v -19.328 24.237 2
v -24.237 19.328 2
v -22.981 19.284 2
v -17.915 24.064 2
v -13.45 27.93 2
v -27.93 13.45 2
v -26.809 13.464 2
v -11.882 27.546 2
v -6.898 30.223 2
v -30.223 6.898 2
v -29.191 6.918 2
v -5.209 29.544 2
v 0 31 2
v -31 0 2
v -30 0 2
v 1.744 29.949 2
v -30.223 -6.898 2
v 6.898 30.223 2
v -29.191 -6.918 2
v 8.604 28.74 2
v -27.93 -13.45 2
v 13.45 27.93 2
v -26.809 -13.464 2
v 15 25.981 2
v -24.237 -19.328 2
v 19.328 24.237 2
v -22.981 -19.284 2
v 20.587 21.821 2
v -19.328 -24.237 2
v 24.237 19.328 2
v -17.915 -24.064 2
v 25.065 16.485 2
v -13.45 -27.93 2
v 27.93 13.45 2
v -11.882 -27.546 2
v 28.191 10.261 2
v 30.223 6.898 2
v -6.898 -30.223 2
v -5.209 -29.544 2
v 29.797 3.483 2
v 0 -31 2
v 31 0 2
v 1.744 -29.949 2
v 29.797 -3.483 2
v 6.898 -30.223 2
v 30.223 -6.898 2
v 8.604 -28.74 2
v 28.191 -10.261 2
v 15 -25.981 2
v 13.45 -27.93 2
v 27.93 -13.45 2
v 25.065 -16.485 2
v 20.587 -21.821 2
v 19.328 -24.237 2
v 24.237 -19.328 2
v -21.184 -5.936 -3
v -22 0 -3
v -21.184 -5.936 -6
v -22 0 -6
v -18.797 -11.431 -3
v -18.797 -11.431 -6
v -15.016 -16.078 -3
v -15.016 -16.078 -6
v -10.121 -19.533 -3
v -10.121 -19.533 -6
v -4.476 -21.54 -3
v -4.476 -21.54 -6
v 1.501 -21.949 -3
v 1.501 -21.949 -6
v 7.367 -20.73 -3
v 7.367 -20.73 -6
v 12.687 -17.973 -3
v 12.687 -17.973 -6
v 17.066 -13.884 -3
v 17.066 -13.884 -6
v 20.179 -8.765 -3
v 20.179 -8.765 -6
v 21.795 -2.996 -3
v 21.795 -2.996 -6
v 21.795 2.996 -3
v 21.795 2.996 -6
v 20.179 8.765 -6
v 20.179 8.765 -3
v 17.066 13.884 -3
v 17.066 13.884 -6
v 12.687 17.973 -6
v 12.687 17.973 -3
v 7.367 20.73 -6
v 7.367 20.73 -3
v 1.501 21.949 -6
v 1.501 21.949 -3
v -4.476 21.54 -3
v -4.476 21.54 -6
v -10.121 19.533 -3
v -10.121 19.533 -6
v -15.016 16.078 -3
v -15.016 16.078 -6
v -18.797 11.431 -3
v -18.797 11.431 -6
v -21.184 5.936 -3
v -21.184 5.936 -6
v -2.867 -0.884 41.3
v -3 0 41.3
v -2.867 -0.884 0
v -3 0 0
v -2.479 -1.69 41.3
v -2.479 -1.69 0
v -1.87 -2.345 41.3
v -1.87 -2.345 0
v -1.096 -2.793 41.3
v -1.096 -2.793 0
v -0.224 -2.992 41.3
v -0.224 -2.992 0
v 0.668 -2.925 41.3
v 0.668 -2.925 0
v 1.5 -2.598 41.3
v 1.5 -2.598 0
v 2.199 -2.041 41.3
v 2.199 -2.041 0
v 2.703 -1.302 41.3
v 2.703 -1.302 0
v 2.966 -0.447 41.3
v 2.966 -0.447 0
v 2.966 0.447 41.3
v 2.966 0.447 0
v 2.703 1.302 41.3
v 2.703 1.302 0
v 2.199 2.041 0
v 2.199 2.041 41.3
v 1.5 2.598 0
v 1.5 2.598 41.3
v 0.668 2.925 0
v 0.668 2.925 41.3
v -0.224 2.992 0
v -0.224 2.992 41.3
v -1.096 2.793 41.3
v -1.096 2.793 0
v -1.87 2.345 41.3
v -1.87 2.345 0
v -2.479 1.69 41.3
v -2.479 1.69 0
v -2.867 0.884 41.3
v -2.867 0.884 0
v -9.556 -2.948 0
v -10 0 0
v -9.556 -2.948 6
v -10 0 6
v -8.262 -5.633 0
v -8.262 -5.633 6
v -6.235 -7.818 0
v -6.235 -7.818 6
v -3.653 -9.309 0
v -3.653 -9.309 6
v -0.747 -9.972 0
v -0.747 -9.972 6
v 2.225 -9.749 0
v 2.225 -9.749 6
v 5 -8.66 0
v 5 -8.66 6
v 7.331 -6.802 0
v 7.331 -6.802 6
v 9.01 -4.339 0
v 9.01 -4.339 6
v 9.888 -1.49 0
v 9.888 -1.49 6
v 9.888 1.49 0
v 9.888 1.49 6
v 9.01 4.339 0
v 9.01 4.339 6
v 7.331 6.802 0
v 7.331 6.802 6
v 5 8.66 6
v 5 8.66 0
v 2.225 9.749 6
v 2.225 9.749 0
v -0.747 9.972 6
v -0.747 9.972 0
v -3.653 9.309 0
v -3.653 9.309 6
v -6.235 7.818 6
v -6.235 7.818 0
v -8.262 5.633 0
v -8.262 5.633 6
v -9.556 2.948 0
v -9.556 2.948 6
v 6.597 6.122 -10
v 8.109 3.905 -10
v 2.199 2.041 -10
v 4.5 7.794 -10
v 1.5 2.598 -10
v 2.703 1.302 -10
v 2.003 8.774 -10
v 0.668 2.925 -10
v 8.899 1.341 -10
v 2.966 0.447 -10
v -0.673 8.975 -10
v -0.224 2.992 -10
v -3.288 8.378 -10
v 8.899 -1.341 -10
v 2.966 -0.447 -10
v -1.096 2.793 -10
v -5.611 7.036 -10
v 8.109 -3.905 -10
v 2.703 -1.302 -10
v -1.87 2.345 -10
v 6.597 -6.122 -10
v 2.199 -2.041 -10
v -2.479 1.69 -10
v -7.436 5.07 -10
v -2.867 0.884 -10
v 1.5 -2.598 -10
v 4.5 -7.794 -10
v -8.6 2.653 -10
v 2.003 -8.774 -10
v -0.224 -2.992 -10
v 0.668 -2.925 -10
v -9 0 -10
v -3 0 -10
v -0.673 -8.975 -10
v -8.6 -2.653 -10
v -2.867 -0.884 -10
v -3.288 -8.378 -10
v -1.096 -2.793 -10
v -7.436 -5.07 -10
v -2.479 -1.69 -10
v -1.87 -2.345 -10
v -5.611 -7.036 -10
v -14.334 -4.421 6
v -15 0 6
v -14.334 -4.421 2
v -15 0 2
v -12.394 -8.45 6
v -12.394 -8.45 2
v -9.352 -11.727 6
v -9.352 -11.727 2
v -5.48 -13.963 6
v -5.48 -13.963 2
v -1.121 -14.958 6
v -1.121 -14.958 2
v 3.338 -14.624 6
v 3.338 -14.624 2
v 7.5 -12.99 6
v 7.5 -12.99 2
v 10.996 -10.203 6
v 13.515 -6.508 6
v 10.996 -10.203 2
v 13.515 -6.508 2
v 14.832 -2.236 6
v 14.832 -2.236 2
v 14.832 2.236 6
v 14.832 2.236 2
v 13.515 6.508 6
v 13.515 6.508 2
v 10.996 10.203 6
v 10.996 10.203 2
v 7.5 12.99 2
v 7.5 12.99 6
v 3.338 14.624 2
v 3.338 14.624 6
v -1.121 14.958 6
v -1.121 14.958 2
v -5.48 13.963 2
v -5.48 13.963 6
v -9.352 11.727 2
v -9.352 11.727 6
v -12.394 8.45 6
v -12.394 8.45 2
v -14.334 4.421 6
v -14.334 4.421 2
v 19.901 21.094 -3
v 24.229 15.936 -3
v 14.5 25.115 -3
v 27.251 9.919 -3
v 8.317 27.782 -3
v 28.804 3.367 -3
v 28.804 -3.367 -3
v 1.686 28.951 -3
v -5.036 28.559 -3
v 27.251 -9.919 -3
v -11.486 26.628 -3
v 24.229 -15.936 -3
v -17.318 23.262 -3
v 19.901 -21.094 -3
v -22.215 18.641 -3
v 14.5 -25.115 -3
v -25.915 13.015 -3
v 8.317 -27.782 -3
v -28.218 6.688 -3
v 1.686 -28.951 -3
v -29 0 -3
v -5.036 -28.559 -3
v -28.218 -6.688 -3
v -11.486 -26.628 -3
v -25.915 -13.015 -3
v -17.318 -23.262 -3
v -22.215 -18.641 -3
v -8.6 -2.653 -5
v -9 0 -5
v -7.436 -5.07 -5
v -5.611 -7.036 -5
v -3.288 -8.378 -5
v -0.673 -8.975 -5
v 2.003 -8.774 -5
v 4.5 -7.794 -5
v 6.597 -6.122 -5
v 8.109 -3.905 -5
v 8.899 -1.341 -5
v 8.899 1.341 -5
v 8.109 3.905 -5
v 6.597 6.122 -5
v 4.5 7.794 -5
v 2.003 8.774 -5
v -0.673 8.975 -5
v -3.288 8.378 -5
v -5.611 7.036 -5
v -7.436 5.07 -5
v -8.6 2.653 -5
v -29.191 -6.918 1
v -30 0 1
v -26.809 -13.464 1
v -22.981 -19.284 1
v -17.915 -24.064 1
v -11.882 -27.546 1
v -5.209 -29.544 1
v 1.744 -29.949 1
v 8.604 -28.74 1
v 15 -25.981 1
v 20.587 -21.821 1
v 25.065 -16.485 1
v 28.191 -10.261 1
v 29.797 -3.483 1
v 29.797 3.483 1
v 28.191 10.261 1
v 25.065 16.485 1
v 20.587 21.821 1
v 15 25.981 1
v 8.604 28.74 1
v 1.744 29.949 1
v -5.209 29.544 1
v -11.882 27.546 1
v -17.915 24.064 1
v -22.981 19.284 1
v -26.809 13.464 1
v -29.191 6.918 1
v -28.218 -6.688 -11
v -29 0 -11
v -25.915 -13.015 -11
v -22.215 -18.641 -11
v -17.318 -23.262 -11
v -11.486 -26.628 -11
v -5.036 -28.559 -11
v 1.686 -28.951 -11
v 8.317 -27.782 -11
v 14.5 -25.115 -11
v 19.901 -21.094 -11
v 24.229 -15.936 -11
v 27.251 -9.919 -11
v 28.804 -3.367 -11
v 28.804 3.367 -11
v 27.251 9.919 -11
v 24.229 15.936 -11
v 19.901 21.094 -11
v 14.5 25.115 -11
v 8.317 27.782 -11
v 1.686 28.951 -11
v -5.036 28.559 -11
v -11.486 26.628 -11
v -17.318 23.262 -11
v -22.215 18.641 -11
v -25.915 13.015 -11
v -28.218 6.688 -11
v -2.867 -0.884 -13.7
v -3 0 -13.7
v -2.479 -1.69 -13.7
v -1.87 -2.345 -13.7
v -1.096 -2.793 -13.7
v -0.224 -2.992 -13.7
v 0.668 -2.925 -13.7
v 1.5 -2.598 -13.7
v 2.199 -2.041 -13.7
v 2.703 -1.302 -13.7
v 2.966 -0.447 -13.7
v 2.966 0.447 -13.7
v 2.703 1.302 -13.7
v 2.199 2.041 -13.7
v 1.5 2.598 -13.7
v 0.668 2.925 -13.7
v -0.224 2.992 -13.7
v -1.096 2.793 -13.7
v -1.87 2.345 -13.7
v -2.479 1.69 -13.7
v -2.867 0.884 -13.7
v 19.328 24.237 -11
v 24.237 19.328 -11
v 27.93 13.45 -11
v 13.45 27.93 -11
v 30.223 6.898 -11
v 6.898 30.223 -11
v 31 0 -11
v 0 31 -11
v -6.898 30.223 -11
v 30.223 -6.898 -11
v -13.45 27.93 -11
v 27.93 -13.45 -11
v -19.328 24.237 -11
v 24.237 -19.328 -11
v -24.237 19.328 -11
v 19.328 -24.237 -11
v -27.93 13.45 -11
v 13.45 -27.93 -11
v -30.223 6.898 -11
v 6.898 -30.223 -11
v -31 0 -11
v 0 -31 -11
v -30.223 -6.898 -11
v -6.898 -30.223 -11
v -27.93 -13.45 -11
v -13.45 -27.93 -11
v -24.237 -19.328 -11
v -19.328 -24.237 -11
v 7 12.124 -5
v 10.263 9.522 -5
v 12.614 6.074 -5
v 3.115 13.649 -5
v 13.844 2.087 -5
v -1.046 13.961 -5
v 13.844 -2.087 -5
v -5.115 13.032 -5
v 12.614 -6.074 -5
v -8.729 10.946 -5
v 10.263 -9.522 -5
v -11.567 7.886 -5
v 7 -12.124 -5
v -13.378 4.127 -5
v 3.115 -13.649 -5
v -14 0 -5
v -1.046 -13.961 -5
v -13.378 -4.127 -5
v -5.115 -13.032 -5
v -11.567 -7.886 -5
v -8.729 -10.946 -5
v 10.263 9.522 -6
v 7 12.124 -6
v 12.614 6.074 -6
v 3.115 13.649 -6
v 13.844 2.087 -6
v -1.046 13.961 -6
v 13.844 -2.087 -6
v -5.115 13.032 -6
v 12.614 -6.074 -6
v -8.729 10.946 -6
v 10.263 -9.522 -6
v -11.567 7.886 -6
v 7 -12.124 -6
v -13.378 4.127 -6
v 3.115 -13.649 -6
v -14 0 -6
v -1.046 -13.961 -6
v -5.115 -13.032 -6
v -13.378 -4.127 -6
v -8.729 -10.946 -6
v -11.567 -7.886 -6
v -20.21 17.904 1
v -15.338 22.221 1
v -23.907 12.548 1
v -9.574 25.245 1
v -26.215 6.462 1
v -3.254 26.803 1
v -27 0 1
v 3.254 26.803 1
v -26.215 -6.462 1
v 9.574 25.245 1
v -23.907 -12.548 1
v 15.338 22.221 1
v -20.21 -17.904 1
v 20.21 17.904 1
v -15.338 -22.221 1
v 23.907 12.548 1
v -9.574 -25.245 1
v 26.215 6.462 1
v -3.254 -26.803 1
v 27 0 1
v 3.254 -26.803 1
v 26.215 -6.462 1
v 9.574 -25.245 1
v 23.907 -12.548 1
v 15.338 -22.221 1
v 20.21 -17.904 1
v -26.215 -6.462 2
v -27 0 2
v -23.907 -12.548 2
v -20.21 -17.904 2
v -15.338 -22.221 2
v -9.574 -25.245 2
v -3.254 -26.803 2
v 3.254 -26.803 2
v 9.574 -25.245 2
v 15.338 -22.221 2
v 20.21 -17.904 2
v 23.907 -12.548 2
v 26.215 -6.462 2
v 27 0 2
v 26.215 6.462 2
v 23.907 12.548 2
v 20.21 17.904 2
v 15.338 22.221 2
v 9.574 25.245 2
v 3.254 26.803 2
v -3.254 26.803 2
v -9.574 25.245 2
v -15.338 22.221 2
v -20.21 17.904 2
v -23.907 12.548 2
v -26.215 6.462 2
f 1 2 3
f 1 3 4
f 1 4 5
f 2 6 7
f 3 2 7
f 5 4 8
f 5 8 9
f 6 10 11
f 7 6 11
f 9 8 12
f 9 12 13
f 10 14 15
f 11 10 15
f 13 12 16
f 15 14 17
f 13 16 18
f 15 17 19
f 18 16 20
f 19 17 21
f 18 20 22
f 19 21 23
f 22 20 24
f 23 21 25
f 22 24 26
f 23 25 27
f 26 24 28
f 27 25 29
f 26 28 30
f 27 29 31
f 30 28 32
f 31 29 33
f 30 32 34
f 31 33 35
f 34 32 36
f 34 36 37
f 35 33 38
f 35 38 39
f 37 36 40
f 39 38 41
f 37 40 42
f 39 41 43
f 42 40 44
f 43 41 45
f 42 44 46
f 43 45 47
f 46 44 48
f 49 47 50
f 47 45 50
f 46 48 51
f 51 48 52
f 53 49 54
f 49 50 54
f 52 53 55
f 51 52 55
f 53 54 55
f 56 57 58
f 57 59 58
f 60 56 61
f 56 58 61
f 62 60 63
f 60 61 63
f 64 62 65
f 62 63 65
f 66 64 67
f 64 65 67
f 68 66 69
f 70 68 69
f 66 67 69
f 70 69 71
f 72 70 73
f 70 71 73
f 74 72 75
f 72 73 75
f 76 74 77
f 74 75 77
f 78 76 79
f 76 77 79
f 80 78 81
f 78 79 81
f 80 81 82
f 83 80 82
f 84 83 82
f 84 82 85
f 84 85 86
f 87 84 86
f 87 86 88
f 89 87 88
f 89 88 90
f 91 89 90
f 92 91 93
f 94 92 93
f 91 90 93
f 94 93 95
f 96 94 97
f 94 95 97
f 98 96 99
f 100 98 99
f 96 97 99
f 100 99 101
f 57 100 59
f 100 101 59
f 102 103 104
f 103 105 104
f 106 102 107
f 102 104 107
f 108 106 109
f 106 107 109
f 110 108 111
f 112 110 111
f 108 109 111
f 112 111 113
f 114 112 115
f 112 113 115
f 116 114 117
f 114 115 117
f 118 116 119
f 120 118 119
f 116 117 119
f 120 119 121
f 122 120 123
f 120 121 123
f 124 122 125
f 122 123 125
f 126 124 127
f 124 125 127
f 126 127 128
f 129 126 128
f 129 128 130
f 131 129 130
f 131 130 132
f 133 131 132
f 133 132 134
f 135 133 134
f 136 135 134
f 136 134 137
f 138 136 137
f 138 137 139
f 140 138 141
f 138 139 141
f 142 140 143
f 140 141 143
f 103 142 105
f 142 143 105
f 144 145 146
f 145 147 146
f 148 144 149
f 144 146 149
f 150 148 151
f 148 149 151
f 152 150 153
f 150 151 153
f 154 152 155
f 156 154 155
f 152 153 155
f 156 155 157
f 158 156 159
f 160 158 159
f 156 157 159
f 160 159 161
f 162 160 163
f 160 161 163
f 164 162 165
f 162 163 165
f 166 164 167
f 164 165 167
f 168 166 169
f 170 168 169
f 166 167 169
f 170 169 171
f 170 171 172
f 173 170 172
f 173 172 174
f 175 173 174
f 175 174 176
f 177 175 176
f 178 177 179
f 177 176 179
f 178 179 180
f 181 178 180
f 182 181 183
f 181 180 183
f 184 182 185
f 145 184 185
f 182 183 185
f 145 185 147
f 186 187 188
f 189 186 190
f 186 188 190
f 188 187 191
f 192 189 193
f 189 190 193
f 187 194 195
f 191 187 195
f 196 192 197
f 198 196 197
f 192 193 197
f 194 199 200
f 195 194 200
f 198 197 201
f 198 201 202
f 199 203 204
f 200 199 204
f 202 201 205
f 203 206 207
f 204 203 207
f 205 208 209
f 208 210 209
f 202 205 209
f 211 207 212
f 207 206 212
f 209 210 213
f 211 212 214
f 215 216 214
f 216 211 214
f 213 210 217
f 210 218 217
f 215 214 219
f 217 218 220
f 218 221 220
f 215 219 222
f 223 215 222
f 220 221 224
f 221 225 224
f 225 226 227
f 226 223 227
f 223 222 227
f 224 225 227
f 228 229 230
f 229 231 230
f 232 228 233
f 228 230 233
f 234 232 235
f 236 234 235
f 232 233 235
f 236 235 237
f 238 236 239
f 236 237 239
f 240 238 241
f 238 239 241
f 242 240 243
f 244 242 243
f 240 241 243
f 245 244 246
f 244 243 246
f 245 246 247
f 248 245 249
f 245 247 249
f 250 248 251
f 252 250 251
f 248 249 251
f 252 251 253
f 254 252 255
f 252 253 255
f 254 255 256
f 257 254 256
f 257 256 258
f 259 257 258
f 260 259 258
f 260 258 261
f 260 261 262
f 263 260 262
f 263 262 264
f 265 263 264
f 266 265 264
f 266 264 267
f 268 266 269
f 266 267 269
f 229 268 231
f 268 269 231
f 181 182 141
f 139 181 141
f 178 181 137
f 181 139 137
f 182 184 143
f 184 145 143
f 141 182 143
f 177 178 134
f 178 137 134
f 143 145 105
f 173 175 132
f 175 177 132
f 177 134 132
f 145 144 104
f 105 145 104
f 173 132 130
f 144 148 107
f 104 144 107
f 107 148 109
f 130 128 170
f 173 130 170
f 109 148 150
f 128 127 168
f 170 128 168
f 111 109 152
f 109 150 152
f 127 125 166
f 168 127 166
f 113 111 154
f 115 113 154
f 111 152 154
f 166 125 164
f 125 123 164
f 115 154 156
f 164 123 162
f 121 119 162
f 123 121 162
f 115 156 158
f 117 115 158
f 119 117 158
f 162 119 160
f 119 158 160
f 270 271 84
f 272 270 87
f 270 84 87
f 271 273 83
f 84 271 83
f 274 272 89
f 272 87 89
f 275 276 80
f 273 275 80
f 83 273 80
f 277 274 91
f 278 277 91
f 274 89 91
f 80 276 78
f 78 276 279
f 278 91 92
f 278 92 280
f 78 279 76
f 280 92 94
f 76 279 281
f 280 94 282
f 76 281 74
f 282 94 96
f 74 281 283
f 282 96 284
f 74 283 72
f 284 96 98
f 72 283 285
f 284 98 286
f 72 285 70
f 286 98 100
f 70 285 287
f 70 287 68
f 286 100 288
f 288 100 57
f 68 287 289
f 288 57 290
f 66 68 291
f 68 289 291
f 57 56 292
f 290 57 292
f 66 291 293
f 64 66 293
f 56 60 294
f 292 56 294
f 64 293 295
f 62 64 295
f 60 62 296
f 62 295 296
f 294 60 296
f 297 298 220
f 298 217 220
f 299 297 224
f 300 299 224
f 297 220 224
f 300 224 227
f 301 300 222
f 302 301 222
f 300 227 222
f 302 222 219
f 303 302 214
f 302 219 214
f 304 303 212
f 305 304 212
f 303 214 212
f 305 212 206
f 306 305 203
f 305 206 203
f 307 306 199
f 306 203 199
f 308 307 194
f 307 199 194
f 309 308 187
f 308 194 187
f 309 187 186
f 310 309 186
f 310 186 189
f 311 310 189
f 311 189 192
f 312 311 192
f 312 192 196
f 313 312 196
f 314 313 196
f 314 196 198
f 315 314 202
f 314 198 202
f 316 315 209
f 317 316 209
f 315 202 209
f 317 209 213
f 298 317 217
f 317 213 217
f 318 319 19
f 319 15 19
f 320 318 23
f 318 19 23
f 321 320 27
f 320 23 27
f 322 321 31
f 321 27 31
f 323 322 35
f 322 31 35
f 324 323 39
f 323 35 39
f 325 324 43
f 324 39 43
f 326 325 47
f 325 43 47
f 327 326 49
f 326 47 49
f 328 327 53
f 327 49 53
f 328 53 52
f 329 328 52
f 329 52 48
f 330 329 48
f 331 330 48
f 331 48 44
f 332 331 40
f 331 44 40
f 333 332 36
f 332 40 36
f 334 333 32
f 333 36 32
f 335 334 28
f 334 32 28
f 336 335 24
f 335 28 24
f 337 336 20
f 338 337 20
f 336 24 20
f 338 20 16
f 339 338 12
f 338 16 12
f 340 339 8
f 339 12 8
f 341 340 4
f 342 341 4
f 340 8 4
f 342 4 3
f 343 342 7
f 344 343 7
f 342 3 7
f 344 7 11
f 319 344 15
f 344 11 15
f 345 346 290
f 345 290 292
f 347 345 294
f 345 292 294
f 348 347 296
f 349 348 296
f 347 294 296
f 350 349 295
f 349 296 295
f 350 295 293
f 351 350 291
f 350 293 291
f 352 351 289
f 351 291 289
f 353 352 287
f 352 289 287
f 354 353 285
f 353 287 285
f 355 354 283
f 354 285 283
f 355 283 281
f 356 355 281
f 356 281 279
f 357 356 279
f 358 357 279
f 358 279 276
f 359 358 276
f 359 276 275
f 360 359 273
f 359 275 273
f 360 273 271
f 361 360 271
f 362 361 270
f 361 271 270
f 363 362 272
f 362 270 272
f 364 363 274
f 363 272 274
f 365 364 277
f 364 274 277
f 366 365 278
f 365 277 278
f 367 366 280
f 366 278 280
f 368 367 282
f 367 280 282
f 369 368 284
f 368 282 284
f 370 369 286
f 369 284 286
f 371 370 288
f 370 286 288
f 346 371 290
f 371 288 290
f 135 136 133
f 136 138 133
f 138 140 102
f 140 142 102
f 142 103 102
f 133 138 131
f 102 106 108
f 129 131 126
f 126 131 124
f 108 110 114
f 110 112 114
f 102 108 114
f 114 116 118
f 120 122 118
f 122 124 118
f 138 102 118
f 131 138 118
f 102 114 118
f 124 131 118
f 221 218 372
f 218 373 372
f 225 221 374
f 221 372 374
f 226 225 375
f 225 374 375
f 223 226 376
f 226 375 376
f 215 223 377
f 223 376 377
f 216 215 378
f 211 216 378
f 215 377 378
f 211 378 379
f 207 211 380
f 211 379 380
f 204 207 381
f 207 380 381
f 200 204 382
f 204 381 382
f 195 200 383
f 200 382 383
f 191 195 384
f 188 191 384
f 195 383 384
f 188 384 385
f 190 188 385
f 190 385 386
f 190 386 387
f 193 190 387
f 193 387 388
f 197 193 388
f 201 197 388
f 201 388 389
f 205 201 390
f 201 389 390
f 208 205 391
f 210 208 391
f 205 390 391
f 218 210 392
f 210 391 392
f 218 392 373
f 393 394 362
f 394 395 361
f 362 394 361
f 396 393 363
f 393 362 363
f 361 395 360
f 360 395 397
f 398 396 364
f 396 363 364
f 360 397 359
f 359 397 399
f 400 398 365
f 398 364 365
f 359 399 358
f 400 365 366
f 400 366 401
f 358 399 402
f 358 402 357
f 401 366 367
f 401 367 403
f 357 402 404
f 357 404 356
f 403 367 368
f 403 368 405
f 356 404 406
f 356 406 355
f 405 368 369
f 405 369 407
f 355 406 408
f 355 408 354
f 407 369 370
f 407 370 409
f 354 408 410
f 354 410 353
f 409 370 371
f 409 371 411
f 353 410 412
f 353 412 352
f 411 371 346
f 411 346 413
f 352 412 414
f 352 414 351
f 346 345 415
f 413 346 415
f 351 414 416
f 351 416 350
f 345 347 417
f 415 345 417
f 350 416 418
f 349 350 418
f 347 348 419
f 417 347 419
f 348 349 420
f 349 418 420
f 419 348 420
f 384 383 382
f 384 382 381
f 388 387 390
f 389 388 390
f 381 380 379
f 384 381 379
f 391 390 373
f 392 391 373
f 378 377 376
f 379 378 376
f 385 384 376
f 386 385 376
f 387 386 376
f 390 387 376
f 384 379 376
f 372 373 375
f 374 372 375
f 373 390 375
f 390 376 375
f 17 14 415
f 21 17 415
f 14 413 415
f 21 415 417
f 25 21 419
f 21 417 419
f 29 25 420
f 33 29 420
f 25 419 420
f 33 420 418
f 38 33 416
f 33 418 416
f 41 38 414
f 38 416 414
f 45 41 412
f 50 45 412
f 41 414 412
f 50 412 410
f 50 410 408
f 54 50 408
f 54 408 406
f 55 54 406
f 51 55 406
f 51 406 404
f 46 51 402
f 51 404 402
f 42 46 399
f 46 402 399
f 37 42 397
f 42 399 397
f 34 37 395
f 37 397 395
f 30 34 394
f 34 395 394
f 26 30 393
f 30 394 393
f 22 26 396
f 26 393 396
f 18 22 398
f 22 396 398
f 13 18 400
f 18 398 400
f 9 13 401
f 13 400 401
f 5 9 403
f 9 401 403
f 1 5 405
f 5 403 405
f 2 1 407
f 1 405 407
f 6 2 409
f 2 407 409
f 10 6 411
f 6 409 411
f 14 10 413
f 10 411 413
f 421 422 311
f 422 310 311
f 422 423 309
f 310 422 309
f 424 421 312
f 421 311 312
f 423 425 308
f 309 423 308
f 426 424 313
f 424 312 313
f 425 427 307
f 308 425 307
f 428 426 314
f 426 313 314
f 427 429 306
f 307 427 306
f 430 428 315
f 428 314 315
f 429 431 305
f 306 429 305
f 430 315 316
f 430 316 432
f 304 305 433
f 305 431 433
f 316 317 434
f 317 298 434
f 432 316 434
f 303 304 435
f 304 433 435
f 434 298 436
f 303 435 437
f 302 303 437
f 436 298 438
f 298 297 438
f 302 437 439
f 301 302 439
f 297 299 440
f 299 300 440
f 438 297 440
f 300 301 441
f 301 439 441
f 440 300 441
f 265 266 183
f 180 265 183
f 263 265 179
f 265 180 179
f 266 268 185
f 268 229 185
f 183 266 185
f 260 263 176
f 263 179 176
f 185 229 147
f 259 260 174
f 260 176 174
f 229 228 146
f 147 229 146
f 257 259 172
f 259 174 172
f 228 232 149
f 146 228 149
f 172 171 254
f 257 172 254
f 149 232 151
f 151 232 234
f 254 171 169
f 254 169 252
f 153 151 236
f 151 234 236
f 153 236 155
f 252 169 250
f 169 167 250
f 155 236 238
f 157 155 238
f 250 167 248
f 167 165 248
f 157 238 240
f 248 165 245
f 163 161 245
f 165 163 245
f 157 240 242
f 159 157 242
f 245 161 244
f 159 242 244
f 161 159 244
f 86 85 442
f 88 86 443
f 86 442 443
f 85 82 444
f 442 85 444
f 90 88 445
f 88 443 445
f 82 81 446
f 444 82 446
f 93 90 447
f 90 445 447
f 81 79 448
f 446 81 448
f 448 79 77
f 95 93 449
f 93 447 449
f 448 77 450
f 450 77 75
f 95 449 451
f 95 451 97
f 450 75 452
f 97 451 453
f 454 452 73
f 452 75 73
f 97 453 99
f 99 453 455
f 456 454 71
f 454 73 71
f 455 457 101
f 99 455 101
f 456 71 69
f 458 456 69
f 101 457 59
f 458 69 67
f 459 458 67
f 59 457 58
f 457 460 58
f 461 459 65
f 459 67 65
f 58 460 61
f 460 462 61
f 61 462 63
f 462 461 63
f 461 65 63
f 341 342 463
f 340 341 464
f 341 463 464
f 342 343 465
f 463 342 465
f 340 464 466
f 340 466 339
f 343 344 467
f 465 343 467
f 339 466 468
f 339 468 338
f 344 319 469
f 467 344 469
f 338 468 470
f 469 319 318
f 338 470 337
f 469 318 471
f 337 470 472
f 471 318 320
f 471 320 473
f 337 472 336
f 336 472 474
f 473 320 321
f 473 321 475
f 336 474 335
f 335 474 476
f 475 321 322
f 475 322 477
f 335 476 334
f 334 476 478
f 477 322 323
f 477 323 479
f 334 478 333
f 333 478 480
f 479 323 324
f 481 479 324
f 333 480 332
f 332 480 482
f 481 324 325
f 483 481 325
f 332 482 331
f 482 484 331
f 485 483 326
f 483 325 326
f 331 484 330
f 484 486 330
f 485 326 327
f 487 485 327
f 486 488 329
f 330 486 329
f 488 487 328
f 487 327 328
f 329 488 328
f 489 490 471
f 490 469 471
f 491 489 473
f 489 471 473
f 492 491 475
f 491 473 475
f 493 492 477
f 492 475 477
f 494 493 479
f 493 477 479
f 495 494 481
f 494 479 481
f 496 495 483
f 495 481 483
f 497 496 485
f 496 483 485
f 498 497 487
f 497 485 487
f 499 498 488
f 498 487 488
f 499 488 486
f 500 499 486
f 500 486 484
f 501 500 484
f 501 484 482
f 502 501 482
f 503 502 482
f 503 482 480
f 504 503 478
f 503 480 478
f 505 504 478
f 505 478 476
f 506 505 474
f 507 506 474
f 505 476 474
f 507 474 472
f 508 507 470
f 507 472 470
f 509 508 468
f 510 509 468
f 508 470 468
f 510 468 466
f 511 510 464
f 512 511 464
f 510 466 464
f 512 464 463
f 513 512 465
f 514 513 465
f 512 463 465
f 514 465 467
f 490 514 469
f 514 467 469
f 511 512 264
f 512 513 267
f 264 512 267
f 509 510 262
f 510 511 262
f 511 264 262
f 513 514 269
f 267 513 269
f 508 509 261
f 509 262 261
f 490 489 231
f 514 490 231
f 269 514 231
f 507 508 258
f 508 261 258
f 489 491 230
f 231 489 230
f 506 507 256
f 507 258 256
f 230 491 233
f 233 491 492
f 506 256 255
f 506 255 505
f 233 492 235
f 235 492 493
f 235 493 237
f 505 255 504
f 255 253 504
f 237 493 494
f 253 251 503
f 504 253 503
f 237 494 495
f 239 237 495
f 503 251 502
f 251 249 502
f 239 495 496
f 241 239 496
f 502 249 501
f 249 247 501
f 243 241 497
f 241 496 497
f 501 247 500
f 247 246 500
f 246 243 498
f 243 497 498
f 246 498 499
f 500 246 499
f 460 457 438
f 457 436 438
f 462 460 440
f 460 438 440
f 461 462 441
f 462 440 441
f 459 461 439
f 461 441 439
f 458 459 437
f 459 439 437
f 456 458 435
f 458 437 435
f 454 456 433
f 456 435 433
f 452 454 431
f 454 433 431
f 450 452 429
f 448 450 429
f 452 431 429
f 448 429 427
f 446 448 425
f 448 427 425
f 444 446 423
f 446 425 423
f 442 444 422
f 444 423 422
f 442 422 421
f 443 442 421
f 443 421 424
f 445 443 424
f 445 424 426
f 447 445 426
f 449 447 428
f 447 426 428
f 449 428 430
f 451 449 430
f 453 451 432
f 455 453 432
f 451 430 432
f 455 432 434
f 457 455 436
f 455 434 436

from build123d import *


with BuildPart() as part:
    # Croquis1 → Revolución1 (revolve)
    with BuildSketch(Plane(origin=(0, 0, 0), x_dir=(0, 0, -1), z_dir=(1, 0, 0)), mode=Mode.PRIVATE) as revoluci_n1_sk:
        Polygon((13.7, 0), (-41.3, 0), (-41.3, 3), (0, 3), (0, 10), (-6, 10), (-6, 15), (-2, 15), (-2, 27), (-1, 27), (-1, 30), (-2, 30), (-2, 31), (11, 31), (11, 29), (3, 29), (3, 22), (6, 22), (6, 14), (5, 14), (5, 9), (10, 9), (10, 3), (13.7, 3), align=None)
    revolve(revoluci_n1_sk.sketch.rotate(Axis((0, 0, -13.7), (0, 0, 1)), 90), axis=Axis((0, 0, -13.7), (0, 0, 1)))


solid = part.part
